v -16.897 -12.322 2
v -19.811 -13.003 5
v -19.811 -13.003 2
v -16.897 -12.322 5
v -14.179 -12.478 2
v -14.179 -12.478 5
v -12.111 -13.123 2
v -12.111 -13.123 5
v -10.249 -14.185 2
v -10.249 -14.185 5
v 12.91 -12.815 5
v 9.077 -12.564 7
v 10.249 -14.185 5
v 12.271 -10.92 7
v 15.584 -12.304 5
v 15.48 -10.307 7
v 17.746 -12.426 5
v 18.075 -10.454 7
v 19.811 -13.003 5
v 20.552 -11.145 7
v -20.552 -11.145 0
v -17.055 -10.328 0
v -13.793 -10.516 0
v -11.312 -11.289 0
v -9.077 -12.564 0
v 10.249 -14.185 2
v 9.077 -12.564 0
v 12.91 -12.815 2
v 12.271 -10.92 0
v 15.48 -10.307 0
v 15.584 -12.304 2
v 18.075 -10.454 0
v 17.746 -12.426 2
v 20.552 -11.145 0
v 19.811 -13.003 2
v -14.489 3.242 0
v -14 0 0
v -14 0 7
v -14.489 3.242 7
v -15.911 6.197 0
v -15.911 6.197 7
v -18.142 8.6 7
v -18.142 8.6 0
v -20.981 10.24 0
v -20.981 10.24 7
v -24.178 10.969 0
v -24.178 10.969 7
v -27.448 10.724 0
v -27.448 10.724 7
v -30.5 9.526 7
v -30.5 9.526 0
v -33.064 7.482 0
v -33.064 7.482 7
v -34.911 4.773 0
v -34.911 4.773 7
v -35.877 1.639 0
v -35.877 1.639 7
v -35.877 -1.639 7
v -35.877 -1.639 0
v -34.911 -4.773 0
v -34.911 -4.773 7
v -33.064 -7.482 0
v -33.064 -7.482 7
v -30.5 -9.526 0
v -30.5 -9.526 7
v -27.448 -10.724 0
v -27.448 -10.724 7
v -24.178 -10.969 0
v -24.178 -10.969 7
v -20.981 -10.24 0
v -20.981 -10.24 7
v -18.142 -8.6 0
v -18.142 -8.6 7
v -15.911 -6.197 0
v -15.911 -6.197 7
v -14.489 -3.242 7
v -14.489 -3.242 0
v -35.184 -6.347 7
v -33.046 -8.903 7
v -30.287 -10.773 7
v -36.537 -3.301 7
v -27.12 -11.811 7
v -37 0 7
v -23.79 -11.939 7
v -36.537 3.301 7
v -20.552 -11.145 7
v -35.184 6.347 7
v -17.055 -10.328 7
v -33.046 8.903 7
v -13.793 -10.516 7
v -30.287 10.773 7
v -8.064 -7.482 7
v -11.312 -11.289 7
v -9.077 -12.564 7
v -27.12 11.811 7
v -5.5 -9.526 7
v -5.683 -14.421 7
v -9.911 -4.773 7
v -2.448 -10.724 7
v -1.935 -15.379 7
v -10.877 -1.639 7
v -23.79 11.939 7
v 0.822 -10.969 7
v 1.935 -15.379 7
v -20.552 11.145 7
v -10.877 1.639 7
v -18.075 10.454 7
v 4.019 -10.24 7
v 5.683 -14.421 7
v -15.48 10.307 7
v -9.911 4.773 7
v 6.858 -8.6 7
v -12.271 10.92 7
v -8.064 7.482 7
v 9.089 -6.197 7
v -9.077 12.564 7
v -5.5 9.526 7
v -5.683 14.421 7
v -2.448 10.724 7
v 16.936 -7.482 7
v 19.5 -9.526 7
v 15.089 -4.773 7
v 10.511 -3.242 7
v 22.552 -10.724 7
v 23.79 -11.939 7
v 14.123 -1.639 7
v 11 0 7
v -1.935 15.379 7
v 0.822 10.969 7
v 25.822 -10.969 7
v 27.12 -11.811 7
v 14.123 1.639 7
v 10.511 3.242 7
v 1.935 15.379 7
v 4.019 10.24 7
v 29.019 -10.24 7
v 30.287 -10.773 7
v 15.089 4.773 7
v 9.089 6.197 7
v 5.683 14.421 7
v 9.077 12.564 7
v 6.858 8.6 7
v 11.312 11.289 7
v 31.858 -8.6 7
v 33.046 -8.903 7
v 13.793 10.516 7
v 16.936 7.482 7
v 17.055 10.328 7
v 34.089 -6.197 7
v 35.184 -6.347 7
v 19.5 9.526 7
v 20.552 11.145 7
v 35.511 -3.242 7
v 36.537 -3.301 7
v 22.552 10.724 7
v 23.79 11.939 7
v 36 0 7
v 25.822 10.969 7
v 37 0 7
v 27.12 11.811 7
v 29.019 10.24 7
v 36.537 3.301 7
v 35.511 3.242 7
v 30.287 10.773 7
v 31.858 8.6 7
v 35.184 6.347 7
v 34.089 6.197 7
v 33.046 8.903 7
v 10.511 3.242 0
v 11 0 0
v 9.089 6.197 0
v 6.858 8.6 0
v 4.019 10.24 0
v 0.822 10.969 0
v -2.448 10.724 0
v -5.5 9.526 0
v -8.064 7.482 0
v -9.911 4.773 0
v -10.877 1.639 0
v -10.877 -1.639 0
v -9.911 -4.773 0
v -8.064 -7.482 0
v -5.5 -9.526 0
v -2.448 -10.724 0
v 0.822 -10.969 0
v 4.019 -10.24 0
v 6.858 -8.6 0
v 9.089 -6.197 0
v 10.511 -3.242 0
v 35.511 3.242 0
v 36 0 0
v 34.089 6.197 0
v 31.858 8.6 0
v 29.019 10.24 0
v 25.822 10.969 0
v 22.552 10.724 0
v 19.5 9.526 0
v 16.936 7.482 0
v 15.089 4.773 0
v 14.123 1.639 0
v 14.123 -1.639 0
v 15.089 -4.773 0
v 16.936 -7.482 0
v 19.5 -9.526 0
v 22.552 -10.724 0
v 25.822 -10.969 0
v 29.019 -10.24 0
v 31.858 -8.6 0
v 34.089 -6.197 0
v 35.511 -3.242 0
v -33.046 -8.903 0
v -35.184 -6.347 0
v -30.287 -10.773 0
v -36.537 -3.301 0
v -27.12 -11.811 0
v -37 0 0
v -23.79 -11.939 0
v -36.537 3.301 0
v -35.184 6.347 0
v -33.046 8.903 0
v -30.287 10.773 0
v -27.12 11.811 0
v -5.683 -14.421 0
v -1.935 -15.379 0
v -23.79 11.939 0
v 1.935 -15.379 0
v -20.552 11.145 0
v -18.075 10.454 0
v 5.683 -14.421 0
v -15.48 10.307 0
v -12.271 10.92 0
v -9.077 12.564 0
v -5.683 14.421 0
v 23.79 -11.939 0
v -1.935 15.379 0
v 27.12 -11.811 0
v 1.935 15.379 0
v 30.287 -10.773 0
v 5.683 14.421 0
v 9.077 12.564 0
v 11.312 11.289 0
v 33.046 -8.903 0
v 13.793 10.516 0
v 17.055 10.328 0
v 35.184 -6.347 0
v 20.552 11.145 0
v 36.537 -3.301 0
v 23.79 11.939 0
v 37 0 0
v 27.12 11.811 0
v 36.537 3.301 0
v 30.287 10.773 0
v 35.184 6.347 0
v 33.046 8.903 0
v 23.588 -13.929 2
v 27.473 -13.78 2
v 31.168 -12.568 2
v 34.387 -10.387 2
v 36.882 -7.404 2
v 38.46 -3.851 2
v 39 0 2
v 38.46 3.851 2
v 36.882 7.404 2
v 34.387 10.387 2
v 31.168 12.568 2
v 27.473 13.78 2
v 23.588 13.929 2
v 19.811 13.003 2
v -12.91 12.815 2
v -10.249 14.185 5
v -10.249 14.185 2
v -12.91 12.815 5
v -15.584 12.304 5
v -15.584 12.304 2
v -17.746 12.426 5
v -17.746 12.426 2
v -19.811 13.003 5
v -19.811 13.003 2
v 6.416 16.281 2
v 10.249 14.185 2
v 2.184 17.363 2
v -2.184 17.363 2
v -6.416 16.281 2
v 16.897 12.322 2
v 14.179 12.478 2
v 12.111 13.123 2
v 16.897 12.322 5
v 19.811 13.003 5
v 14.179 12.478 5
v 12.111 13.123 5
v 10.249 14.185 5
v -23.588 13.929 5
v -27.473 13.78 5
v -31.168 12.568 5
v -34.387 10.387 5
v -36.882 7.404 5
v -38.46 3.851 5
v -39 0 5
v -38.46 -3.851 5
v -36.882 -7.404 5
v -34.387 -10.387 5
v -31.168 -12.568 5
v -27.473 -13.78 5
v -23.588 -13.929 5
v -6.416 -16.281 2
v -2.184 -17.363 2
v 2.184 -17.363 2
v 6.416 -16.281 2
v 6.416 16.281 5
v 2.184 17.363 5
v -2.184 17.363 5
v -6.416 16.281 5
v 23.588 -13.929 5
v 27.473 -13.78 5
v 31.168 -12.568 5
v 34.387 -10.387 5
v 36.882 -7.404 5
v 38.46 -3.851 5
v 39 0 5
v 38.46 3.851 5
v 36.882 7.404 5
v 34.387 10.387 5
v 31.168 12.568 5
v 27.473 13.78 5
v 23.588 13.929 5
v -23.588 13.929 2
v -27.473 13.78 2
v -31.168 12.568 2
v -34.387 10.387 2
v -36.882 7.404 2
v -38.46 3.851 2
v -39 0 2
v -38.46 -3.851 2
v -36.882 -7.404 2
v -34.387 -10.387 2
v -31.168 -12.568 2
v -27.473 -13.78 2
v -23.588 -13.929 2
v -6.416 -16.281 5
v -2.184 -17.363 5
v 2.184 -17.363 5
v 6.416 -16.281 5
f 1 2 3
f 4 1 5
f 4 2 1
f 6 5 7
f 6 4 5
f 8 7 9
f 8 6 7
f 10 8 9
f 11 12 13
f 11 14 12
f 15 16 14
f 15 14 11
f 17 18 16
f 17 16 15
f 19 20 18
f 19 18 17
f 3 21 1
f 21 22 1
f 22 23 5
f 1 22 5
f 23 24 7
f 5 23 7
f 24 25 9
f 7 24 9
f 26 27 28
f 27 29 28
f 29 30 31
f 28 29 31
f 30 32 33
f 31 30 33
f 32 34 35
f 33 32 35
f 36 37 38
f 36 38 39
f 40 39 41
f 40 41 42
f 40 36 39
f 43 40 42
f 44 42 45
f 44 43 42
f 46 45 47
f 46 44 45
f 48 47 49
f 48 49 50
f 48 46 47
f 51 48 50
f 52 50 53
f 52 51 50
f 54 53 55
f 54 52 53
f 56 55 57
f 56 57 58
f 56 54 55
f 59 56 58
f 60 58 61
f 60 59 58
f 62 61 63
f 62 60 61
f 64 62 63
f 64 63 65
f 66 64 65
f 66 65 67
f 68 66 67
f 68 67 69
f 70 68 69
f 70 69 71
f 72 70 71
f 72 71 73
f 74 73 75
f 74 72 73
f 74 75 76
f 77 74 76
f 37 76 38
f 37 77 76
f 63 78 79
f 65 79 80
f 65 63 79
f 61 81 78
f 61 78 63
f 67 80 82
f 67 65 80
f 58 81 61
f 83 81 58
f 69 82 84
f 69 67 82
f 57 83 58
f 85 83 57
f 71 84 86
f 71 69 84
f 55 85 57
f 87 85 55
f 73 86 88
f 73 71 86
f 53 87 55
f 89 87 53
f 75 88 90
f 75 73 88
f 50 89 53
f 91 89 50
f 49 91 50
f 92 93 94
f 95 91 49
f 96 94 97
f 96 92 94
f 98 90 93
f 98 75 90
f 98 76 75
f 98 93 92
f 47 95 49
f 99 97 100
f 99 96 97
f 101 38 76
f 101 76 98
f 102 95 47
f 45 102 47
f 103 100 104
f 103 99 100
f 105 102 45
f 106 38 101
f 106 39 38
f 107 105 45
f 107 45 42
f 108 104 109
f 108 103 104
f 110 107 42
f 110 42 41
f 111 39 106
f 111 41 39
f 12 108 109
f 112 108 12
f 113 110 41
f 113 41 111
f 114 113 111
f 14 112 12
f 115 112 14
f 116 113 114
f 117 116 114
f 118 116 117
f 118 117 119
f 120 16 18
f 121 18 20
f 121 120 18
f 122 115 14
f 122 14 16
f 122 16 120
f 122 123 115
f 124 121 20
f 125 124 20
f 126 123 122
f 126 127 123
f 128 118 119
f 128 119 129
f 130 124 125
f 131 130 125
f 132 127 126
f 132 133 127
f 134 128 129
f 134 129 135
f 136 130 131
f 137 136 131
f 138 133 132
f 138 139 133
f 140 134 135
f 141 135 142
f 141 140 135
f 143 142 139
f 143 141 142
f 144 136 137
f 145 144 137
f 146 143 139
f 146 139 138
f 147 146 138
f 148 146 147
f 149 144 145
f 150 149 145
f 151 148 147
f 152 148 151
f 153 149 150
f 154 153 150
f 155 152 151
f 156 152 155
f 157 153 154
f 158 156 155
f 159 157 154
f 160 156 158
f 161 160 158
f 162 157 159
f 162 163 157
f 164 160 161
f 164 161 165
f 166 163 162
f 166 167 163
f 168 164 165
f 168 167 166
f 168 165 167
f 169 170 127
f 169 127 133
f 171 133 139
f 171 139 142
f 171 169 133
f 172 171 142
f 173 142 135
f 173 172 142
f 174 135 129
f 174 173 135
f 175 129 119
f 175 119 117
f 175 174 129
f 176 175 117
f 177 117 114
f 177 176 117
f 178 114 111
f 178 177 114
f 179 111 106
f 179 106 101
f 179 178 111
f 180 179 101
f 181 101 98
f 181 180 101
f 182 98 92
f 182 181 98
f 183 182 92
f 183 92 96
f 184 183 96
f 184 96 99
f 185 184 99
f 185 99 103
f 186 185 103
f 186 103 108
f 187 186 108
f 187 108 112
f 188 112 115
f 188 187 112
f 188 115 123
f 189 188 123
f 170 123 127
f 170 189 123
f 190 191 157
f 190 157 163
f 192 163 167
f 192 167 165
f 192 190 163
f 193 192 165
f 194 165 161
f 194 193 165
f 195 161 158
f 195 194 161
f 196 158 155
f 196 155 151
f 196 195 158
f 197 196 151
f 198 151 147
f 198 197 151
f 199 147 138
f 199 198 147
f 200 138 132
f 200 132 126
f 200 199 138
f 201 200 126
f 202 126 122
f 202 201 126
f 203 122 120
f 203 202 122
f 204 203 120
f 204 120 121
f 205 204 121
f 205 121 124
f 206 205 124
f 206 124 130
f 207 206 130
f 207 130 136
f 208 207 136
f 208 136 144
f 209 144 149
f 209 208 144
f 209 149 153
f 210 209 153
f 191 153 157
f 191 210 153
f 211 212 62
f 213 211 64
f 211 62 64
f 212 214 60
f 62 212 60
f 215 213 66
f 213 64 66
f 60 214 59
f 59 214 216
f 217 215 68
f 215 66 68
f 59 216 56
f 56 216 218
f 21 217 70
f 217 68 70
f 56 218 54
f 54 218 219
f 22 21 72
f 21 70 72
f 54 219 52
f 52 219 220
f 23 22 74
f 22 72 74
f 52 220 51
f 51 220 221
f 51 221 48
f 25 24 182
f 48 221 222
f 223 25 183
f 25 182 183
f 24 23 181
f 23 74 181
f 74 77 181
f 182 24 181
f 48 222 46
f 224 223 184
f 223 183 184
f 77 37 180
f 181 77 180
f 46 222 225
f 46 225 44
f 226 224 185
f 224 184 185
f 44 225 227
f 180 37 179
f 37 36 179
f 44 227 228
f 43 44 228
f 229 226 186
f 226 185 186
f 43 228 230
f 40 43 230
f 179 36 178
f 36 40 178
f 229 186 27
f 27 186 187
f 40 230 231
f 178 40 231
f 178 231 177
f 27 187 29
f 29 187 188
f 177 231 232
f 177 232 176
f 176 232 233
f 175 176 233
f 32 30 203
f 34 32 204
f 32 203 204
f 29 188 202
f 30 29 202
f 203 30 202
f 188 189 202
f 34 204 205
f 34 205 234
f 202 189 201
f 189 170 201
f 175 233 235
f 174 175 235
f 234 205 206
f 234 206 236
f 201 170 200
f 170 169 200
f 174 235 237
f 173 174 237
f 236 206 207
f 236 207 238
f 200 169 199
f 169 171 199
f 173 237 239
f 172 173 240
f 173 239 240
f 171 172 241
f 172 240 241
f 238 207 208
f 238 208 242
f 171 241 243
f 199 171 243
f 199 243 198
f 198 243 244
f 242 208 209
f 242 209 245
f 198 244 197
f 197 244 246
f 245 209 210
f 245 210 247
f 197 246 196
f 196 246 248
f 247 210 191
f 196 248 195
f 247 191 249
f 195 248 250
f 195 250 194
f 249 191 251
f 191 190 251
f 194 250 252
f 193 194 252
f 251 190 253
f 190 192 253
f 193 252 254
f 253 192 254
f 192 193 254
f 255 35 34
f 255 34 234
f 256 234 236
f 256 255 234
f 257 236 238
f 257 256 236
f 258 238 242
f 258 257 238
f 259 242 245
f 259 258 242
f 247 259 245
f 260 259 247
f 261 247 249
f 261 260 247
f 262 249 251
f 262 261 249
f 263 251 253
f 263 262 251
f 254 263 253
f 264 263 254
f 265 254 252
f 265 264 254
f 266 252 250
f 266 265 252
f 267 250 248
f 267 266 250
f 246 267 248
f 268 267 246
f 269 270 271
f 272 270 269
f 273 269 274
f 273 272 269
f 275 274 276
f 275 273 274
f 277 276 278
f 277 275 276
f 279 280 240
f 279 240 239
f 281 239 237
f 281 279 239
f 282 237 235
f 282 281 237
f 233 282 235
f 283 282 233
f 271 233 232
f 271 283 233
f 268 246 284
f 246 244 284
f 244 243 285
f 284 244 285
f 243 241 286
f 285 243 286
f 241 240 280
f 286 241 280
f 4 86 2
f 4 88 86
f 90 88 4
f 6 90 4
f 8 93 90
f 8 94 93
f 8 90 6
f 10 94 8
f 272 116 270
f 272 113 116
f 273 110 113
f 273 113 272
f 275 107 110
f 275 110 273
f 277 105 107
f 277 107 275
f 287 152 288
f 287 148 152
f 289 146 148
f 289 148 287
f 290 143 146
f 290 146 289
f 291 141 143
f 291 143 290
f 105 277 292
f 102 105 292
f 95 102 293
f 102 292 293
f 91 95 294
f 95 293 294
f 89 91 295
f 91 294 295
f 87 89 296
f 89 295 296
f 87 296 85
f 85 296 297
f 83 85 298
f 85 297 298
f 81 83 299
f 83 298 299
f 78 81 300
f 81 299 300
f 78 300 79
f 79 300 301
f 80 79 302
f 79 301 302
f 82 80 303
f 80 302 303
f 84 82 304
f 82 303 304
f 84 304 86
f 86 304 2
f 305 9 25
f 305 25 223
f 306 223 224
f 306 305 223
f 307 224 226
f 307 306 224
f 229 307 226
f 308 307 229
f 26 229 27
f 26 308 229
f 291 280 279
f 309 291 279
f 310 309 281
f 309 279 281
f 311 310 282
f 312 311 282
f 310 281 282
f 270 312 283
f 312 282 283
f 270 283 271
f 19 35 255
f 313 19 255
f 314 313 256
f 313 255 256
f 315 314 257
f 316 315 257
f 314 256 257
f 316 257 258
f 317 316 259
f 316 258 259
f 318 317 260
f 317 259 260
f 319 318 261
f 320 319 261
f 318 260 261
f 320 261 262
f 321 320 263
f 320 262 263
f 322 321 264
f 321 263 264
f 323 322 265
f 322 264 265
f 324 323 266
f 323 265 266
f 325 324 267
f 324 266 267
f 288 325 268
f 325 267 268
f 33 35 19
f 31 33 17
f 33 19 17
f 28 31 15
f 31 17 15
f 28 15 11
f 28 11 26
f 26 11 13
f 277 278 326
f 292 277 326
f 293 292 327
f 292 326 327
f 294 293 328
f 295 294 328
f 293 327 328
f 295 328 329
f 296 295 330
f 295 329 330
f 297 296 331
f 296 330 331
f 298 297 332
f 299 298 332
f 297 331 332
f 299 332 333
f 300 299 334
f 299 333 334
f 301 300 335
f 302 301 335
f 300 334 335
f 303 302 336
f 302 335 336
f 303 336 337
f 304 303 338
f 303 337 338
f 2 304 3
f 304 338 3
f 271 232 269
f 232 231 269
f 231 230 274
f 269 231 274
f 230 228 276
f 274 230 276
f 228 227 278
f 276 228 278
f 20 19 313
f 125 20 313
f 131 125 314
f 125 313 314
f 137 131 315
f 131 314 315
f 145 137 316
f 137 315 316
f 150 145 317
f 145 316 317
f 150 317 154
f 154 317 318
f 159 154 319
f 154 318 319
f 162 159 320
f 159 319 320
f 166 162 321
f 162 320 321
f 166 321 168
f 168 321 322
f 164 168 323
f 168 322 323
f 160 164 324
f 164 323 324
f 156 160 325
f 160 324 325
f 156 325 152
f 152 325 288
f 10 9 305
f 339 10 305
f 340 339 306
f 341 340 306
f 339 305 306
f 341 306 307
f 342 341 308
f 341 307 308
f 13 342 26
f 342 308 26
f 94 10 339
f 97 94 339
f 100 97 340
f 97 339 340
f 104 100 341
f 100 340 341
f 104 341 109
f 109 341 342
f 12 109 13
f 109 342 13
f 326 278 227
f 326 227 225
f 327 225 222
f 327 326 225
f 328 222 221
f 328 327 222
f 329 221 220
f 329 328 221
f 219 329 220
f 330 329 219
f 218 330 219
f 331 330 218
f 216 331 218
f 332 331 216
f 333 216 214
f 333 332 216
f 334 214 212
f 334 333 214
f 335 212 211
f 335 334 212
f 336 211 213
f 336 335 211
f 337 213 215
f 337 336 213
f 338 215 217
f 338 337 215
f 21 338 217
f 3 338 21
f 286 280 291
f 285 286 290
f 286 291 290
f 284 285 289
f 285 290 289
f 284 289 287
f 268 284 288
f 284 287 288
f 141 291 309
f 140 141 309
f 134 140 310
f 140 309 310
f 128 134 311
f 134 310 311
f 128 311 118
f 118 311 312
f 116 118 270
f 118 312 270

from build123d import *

# Parameters (mm, degrees)
F0_R     = 11
F1_DEPTH = 7
F2_R     = 10
F3_SIZE  = 2
F4_SIZE  = 2


with BuildPart() as f1:
    # F0 (on Top) → F1 (new body)
    with BuildSketch(Plane.XY):
        with BuildLine():
            ThreePointArc((14.705, 9.487517), (0, 17.5), (-14.705, 9.487517))
            ThreePointArc((-14.705, 9.487517), (-39, 0), (-14.705, -9.487517))
            ThreePointArc((-14.705, -9.487517), (0, -17.5), (14.705, -9.487517))
            ThreePointArc((14.705, -9.487517), (39, 0), (14.705, 9.487517))
        make_face()
        with Locations((-25, 0)):
            Circle(F0_R, mode=Mode.SUBTRACT)
        Circle(F0_R, mode=Mode.SUBTRACT)
        with Locations((25, 0)):
            Circle(F0_R, mode=Mode.SUBTRACT)
    extrude(amount=F1_DEPTH)

    # F2
    f2_edges = [f1.edges().sort_by_distance(p)[0] for p in [
        (-14.705, -9.487517, 3.5),
        (14.705, -9.487517, 3.5),
        (-14.705, 9.487517, 3.5),
        (14.705, 9.487517, 3.5),
    ]]
    fillet(f2_edges, radius=F2_R)

    # F3
    f3_edges = [f1.edges().sort_by_distance(p)[0] for p in [
        (-39, 0, 7),
    ]]
    chamfer(f3_edges, length=F3_SIZE)

    # F4
    f4_edges = [f1.edges().sort_by_distance(p)[0] for p in [
        (-39, 0, 0),
    ]]
    chamfer(f4_edges, length=F4_SIZE)


solid = f1.part
